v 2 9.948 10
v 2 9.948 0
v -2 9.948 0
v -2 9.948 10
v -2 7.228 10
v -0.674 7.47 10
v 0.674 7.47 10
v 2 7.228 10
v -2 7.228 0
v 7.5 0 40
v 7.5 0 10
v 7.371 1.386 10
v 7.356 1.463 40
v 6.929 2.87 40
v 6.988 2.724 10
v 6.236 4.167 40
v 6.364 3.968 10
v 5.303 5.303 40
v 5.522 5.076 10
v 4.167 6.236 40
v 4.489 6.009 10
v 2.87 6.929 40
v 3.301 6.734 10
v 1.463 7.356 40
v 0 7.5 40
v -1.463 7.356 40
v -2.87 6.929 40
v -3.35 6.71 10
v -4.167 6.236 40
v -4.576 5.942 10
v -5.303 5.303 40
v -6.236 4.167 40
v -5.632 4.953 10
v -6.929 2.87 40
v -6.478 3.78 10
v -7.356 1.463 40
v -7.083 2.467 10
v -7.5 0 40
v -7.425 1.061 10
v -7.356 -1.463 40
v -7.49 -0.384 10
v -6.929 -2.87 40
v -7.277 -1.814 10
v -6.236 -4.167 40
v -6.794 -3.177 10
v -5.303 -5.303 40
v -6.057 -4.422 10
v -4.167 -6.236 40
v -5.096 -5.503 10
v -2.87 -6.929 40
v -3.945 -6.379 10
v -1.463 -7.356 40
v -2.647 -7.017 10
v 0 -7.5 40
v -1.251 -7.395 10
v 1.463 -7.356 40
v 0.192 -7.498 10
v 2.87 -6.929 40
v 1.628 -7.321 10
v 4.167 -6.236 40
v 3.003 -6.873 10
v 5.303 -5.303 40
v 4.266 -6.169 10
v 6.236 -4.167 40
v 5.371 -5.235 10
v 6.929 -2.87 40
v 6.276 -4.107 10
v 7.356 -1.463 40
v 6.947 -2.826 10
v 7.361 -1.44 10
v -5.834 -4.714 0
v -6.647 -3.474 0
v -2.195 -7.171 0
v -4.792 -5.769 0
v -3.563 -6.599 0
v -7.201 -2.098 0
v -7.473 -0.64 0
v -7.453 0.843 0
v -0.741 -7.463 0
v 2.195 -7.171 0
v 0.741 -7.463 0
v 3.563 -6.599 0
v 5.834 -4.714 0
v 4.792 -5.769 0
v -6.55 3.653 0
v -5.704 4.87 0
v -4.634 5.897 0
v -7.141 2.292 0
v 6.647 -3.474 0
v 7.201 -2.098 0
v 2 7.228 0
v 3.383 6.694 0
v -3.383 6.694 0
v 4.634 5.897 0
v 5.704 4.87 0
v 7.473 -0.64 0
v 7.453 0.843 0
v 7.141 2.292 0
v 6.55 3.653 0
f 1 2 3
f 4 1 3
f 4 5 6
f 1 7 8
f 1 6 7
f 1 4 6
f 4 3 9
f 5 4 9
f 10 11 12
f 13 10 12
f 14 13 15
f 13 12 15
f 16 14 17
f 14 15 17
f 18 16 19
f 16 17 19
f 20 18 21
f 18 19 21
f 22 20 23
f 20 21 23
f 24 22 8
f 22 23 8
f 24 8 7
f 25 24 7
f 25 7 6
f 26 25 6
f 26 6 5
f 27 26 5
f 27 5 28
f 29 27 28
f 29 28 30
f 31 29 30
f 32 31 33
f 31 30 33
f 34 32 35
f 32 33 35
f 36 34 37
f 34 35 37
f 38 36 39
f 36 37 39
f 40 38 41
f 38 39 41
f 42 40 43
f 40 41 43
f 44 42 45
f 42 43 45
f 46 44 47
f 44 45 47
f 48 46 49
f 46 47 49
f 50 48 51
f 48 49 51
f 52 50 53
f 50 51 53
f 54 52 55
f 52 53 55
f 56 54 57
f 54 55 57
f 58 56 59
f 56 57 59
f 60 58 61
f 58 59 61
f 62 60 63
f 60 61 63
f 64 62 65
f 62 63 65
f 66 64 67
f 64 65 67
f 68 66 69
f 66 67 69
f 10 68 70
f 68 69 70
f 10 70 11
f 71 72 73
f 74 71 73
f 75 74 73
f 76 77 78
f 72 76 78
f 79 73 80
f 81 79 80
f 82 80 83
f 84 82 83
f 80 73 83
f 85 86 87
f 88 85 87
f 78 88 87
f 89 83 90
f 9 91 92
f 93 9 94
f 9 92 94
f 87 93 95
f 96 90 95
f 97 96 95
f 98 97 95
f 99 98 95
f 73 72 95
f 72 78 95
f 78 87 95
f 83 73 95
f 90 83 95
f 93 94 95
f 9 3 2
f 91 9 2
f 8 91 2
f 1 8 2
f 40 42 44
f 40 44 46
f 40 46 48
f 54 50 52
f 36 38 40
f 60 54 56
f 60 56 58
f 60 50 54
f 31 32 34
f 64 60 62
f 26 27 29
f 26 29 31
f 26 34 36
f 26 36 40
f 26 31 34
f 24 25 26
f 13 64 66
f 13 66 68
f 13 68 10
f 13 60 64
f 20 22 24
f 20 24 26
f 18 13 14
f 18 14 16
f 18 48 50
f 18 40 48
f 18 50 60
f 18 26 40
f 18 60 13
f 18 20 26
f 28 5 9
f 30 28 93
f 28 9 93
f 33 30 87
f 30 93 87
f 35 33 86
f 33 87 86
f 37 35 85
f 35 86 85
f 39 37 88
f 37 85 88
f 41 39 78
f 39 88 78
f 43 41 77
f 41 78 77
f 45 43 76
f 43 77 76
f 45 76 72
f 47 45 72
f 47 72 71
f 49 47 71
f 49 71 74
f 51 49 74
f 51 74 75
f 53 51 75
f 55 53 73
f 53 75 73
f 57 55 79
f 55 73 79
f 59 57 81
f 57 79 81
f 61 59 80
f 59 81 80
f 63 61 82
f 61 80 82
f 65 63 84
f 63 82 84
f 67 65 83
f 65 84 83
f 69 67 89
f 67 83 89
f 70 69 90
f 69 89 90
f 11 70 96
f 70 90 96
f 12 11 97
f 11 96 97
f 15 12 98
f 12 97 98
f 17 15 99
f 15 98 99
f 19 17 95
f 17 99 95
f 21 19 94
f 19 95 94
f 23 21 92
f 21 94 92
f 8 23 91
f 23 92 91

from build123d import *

# Parameters (mm, degrees)
F1_DEPTH = 10
F2_R     = 7.5
F3_DEPTH = 30


with BuildPart() as f1:
    # F0 (on Top) → F1 (new body)
    with BuildSketch(Plane.XY):
        with BuildLine():
            Line((-2, 9.948416), (-2, 7.228416))
            ThreePointArc((-2, 7.228416), (0, -7.5), (2, 7.228416))
            Line((2, 7.228416), (2, 9.948416))
            Line((2, 9.948416), (-2, 9.948416))
        make_face()
    extrude(amount=F1_DEPTH)

    # F2 (on face) → F3 (join)
    with BuildSketch(Plane.XY.offset(10)):
        Circle(F2_R)
    extrude(amount=F3_DEPTH)


solid = f1.part
